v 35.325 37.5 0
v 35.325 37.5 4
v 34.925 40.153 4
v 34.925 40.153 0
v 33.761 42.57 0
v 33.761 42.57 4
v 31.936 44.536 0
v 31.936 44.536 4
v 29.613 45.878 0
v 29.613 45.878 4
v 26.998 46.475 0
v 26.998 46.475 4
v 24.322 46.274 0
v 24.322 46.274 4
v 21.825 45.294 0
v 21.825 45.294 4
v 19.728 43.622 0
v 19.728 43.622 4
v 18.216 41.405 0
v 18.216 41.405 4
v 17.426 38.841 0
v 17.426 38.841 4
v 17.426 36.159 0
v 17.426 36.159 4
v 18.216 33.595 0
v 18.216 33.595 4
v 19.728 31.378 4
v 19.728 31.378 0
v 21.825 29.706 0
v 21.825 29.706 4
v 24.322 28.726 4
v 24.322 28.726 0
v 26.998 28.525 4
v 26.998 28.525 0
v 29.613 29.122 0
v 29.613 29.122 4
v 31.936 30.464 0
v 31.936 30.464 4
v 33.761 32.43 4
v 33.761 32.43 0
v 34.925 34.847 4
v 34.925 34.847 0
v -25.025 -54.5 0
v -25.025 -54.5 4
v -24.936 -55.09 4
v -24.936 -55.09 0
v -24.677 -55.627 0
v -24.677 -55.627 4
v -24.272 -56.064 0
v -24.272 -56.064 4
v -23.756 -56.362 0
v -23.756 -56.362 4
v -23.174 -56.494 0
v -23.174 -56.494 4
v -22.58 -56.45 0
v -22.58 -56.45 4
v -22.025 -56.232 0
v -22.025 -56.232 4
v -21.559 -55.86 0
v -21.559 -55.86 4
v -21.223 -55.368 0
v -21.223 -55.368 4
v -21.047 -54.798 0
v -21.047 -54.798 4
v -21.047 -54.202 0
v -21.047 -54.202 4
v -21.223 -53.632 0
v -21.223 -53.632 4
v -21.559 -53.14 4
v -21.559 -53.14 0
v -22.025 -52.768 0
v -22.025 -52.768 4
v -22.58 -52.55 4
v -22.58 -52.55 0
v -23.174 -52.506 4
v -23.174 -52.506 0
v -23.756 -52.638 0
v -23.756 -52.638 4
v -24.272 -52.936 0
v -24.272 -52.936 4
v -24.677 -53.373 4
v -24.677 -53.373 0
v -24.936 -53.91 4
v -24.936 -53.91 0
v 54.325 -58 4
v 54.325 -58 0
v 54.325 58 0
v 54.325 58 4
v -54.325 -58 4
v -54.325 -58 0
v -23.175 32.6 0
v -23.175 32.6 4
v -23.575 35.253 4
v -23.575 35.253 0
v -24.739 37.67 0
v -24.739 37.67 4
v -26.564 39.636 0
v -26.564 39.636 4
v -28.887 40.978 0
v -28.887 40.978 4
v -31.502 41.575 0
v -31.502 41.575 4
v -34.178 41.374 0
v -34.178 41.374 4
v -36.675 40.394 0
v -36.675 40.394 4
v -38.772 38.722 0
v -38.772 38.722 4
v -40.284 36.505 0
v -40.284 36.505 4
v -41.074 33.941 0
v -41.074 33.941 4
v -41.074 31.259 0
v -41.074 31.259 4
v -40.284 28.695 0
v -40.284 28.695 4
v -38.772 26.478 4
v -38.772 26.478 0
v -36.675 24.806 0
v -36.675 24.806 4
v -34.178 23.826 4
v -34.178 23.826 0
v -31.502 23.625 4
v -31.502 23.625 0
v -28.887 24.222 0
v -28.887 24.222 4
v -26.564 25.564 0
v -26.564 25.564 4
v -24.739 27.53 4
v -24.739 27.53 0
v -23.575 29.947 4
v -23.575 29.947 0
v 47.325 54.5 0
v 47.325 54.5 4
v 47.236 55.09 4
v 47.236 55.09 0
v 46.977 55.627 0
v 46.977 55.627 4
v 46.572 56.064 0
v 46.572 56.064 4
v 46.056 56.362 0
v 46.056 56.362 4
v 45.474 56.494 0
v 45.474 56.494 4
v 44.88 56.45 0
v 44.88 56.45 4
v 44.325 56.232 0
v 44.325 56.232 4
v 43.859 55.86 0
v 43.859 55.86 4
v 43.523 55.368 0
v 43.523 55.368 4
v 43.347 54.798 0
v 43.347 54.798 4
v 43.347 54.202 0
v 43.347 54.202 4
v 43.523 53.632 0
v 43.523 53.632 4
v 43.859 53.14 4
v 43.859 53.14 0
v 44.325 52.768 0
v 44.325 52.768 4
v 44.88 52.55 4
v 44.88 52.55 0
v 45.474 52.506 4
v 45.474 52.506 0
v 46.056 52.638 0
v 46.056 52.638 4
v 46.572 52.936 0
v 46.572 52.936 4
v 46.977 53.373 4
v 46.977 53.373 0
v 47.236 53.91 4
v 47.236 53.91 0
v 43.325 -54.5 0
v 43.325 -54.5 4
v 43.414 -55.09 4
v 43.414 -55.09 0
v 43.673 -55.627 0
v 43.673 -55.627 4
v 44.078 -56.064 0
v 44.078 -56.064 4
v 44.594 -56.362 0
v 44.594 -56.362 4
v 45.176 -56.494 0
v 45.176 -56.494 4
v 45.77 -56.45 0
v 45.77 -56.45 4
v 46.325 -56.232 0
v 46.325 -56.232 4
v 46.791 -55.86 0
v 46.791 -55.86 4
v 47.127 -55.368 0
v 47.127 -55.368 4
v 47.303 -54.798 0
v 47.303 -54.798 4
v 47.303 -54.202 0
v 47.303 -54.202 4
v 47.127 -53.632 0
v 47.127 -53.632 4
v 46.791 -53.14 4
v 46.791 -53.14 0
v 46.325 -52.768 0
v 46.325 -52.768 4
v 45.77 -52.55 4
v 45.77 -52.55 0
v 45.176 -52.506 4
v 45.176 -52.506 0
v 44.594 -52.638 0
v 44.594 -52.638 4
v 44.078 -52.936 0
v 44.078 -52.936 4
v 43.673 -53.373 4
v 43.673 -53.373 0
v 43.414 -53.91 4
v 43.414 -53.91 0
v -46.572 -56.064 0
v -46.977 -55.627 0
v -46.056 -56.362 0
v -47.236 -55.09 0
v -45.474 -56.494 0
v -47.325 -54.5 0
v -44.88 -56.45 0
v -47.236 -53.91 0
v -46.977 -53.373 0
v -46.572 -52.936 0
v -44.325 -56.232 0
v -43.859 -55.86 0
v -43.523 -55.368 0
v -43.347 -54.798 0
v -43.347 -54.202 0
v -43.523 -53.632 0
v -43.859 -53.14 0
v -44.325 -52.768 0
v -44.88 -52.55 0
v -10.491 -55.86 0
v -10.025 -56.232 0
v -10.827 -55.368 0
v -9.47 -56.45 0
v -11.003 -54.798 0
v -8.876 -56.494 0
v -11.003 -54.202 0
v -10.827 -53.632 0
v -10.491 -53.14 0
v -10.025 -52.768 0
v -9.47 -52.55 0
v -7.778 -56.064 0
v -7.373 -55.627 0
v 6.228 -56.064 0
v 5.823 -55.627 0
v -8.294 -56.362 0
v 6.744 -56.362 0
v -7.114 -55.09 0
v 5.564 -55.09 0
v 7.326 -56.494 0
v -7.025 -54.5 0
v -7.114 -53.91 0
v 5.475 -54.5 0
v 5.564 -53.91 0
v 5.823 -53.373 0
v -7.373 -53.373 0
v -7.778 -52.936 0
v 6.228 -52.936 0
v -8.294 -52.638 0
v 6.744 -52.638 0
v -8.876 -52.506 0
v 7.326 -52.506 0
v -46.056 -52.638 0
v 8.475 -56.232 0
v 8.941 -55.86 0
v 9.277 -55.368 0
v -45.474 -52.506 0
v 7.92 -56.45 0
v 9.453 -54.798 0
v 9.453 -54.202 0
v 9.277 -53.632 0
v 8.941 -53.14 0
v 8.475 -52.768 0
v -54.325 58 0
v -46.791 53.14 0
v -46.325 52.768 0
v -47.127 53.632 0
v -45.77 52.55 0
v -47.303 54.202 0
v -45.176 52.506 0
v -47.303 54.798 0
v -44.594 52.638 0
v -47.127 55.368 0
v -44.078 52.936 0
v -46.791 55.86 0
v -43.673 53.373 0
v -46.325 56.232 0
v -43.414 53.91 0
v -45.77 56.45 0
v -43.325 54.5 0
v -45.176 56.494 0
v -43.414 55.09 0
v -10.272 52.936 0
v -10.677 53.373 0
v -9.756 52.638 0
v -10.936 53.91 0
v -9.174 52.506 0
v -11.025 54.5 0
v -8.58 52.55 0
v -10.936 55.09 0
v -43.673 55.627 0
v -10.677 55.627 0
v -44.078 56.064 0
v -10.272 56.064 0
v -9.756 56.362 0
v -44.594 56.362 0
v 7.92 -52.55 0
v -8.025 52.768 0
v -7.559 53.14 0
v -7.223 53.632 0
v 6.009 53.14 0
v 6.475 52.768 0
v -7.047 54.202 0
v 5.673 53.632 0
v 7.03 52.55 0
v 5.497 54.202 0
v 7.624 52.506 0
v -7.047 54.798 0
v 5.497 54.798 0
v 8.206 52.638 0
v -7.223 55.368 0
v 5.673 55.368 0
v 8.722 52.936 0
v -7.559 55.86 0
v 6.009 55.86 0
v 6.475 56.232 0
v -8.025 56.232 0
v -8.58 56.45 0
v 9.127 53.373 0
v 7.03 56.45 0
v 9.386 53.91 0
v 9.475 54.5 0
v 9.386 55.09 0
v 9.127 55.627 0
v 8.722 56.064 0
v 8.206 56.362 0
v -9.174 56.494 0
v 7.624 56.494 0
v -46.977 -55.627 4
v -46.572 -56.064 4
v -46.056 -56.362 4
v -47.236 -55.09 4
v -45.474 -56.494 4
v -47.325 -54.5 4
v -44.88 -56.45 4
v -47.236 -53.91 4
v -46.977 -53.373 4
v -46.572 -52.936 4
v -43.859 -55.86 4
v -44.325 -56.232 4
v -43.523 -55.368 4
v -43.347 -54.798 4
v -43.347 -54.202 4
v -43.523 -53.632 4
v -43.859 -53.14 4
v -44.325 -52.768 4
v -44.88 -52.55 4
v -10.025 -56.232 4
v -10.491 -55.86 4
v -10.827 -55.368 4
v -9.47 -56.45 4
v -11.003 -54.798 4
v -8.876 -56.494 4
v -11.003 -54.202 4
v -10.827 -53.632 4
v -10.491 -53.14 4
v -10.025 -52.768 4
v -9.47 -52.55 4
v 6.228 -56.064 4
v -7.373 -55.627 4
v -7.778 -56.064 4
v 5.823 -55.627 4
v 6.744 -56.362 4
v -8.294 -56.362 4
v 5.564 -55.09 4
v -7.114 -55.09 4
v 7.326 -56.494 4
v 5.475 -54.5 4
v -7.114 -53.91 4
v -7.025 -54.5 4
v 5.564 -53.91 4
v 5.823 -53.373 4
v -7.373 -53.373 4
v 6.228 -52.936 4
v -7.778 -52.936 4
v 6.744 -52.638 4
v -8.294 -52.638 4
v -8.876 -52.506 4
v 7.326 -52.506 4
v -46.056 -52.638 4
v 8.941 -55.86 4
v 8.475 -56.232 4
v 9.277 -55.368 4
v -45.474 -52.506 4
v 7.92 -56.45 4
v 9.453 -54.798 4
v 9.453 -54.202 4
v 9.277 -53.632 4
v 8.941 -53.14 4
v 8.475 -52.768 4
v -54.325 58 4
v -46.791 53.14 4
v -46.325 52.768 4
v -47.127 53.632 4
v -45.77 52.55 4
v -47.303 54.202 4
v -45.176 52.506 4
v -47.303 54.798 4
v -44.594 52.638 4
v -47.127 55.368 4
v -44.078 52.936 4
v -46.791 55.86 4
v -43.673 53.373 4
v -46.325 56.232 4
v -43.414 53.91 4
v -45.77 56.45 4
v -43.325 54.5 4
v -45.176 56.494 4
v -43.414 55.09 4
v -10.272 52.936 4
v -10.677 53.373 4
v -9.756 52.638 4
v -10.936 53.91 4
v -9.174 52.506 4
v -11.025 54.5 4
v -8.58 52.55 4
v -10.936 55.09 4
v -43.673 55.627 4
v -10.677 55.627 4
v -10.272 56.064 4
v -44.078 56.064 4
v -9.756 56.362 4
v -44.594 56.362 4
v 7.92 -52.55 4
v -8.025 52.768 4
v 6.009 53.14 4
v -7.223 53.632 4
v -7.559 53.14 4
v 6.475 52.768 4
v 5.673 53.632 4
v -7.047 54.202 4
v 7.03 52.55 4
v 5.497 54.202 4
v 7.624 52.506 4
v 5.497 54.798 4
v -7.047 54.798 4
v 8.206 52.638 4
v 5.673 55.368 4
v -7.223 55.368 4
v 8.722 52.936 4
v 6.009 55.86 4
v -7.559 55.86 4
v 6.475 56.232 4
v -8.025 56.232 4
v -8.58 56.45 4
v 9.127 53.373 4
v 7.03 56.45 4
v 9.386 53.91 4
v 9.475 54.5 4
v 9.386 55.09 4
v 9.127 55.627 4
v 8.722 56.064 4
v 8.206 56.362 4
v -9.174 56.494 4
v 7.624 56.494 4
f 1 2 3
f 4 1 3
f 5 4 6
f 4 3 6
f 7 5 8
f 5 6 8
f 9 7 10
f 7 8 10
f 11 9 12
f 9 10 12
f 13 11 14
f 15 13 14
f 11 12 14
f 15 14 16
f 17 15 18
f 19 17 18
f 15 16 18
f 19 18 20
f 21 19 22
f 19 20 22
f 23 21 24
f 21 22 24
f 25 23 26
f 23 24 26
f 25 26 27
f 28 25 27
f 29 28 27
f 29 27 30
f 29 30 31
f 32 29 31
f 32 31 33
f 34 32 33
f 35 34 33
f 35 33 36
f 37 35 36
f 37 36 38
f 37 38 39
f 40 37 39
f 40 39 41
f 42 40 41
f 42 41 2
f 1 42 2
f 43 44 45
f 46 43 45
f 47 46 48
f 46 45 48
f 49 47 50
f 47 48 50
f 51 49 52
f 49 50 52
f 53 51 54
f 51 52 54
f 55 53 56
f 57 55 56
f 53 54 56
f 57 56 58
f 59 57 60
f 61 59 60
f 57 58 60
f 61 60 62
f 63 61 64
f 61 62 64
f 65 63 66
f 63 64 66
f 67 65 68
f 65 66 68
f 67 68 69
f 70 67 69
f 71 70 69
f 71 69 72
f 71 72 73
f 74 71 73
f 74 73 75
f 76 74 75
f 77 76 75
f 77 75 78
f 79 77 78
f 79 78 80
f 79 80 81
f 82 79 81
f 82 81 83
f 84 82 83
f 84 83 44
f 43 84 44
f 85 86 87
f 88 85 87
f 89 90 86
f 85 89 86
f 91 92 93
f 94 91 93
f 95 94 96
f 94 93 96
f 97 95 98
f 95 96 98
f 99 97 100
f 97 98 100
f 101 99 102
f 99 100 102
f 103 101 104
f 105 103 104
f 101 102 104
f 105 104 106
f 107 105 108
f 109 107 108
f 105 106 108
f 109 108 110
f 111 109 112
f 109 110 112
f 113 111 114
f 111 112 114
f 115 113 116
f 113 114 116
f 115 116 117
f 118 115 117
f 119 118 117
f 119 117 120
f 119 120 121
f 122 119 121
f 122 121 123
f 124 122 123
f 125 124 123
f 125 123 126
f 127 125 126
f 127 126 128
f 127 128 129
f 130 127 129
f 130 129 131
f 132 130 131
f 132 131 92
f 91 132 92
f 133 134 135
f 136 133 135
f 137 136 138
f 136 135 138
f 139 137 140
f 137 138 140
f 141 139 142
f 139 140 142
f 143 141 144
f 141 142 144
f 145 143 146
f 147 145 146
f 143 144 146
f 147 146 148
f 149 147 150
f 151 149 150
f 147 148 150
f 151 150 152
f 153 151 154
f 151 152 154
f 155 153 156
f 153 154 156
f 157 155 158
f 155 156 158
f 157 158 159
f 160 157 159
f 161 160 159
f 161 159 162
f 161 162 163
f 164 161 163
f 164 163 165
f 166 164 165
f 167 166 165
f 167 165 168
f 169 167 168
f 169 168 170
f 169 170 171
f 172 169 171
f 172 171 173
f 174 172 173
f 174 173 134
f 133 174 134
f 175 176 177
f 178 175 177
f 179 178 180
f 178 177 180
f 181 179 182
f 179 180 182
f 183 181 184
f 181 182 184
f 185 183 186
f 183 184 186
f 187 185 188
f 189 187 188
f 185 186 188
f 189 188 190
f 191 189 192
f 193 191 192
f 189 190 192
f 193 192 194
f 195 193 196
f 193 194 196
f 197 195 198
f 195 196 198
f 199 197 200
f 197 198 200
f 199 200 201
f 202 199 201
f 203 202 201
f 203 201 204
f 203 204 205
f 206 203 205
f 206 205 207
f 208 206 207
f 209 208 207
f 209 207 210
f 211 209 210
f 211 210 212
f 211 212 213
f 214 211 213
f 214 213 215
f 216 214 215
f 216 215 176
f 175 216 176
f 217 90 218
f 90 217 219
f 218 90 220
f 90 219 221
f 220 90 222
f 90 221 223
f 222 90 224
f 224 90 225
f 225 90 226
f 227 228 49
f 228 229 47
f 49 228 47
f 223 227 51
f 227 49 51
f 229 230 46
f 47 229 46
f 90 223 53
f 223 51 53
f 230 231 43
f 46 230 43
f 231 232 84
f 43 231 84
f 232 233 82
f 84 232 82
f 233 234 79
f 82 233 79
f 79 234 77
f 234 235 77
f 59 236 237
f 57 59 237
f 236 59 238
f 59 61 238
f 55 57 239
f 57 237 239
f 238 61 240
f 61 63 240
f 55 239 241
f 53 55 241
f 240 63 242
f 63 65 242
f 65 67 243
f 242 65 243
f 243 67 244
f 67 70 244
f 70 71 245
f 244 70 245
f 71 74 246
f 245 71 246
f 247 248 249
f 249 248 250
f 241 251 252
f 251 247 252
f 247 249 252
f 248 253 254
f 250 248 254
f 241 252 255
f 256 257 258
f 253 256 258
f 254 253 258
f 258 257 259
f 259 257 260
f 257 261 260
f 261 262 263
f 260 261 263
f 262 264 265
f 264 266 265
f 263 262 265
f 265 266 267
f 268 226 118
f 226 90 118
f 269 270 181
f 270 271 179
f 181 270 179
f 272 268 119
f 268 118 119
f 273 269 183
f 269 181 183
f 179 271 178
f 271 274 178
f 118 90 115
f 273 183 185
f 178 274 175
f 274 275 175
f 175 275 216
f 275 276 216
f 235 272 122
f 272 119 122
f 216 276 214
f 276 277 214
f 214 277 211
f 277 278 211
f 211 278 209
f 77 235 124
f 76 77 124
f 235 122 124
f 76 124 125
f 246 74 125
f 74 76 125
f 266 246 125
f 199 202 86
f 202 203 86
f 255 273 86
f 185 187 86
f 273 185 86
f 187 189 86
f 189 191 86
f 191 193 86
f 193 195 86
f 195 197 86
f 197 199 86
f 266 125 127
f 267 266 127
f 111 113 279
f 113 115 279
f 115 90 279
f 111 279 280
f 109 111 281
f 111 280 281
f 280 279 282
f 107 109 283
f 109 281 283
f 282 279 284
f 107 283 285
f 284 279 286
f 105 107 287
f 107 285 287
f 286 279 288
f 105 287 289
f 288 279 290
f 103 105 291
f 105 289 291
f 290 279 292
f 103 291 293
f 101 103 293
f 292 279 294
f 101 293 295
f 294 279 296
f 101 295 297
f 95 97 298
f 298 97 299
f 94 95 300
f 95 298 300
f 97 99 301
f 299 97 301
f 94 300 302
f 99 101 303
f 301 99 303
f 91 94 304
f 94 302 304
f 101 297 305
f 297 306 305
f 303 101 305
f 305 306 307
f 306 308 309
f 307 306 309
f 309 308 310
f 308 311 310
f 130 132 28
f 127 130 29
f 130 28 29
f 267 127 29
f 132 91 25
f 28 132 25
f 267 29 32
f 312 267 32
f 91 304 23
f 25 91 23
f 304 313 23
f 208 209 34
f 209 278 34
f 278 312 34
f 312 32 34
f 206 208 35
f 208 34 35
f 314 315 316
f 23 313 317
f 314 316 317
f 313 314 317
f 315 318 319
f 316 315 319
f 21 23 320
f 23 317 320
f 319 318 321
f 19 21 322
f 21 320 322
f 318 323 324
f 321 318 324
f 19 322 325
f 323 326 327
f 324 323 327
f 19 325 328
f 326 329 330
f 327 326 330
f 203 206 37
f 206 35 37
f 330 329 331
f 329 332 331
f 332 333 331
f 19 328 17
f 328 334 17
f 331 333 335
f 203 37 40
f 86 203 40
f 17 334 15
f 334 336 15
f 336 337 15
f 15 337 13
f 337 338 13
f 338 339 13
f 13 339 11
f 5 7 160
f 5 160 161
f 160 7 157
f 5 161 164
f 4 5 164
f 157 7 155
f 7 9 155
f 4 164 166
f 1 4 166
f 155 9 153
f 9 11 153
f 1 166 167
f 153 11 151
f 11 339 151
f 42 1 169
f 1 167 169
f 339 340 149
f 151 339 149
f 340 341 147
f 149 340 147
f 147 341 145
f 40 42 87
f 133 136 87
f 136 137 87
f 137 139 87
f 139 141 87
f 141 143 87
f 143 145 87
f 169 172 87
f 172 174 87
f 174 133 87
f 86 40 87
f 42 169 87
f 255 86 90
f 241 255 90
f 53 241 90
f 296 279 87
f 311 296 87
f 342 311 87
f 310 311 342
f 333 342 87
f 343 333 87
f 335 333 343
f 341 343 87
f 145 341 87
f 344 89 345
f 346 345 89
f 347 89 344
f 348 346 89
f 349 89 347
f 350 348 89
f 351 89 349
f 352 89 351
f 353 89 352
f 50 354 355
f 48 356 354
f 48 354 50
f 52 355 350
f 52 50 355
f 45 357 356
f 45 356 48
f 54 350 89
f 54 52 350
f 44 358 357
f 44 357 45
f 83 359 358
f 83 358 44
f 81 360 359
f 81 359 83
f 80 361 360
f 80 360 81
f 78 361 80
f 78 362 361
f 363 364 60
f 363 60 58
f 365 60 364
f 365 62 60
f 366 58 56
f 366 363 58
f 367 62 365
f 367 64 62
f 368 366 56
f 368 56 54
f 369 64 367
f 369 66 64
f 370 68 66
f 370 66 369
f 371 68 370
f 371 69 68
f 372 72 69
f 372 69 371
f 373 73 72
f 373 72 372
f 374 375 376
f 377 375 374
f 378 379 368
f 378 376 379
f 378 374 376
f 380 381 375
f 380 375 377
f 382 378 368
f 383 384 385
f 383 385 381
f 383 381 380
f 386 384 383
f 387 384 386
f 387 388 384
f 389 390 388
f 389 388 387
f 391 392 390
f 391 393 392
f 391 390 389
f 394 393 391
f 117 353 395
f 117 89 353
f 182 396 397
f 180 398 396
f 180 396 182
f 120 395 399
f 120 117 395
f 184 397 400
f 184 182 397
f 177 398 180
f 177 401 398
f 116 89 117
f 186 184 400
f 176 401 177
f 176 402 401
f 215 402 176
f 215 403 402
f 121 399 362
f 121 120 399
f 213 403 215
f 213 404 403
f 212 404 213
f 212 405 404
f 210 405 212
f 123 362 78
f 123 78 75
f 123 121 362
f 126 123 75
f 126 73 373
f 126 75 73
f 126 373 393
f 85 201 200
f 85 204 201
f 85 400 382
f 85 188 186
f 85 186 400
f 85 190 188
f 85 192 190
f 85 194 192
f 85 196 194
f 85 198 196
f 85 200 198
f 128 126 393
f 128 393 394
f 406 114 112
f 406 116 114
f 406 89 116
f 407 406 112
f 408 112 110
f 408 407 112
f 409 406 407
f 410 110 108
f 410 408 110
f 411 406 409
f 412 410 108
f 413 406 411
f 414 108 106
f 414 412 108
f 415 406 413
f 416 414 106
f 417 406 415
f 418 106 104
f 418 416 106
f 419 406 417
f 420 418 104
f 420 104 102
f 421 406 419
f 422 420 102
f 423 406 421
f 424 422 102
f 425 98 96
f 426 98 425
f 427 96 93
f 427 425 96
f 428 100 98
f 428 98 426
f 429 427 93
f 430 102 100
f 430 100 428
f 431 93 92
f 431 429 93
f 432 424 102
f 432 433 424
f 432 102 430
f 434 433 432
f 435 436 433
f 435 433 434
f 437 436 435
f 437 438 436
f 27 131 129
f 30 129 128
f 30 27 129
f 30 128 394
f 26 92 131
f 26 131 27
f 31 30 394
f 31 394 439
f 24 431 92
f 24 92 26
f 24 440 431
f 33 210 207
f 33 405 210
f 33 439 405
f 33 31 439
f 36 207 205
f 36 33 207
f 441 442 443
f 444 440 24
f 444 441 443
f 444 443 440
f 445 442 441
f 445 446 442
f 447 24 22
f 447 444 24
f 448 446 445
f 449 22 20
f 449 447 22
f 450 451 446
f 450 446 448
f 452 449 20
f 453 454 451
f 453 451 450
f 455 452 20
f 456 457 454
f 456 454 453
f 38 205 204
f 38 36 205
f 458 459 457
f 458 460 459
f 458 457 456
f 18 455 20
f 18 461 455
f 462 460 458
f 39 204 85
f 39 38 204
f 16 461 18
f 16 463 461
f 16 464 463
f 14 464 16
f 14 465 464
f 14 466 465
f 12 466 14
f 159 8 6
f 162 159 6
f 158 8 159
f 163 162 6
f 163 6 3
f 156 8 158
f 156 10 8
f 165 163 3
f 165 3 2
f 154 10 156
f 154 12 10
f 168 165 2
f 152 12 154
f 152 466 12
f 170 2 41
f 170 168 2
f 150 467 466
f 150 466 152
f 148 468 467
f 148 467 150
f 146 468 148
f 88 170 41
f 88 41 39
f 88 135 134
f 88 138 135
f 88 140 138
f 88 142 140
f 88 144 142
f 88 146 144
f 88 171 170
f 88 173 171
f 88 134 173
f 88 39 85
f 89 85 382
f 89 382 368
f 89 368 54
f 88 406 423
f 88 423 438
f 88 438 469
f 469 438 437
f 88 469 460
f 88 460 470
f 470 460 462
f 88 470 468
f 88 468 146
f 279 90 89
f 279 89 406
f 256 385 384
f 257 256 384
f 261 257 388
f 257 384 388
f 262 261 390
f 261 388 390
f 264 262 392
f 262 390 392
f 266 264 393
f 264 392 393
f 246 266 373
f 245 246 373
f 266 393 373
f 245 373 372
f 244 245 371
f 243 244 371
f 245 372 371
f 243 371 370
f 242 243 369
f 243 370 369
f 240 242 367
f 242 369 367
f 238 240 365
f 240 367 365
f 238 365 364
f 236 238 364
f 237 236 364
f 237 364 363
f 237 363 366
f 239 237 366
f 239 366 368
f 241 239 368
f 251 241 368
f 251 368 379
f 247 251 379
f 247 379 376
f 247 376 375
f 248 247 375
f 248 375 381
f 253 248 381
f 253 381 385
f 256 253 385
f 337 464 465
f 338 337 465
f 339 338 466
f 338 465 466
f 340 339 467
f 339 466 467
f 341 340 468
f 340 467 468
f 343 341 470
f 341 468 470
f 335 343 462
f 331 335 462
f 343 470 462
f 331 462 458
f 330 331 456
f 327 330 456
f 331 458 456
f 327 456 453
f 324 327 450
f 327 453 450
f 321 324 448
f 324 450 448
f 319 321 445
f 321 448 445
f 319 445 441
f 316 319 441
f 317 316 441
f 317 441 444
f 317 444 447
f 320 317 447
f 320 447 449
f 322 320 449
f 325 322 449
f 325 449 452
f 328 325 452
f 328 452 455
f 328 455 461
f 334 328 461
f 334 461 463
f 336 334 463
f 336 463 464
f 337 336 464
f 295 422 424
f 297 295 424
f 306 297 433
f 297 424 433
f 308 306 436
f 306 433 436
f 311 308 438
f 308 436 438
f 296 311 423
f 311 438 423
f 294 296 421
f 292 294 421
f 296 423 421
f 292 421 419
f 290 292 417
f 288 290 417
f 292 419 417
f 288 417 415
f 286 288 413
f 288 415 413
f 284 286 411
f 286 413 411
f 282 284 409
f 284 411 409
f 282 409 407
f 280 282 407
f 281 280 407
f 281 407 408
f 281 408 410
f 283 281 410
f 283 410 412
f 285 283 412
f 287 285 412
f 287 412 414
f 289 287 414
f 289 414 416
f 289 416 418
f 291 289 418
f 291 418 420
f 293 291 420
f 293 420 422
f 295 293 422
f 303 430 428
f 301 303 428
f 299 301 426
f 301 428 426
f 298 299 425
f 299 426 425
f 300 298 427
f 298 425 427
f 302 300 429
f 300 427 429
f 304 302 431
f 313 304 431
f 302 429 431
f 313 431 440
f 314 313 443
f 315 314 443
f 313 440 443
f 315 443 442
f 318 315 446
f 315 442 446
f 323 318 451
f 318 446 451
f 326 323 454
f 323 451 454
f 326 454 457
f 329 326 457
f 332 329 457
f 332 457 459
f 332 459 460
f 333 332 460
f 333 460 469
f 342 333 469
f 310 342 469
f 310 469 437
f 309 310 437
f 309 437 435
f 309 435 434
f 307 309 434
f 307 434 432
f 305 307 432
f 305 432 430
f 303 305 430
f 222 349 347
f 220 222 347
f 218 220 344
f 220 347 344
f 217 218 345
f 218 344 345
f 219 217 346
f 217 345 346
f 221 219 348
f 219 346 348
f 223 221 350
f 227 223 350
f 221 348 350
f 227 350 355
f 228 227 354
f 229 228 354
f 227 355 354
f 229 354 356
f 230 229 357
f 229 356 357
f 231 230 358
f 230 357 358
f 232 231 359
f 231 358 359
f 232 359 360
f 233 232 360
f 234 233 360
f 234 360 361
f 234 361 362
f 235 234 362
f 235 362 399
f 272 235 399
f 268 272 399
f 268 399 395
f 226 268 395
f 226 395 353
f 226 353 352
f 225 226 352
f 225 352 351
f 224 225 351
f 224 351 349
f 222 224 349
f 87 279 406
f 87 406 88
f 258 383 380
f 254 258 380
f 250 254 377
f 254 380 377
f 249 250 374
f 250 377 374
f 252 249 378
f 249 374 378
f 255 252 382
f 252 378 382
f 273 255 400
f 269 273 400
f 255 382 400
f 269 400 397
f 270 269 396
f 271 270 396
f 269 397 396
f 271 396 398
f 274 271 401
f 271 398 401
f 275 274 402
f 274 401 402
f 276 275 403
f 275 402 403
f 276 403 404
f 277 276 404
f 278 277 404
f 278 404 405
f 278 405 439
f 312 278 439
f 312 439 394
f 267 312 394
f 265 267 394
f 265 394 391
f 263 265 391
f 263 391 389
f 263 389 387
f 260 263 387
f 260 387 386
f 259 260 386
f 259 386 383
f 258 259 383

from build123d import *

# Parameters (mm, degrees)
SKETCH1_W           = 108.65
SKETCH1_H           = 116
BOSS_EXTRUDE1_DEPTH = 4
SKETCH2_R           = 9
CUT_EXTRUDE1_DEPTH  = 80.568873468
SKETCH4_R           = 2
CUT_EXTRUDE2_DEPTH  = 80.568873468


with BuildPart() as part:
    # Sketch1 → Boss-Extrude1 (new body)
    with BuildSketch(Plane.XY):
        Rectangle(SKETCH1_W, SKETCH1_H)
    extrude(amount=BOSS_EXTRUDE1_DEPTH)

    # Sketch2 → Cut-Extrude1 (cut, through all)
    with BuildSketch(Plane.XY.offset(4)):
        with Locations((26.325, 37.5)):
            Circle(SKETCH2_R)
        with Locations((-32.175, 32.6)):
            Circle(SKETCH2_R)
    extrude(amount=-CUT_EXTRUDE1_DEPTH, mode=Mode.SUBTRACT)

    # Sketch4 → Cut-Extrude2 (cut, through all)
    with BuildSketch(Plane.XY.offset(4)):
        with Locations((-45.325, 54.5)):
            Circle(SKETCH4_R)
        with Locations(Location((-45.325, -54.5, 0), (0, 0, 180))):
            Circle(SKETCH4_R)
        with Locations(Location((-9.025, 54.5, 0), (0, 0, 180))):
            Circle(SKETCH4_R)
        with Locations((-9.025, -54.5)):
            Circle(SKETCH4_R)
        with Locations(Location((-23.025, -54.5, 0), (0, 0, 180))):
            Circle(SKETCH4_R)
        with Locations((7.475, 54.5)):
            Circle(SKETCH4_R)
        with Locations(Location((7.475, -54.5, 0), (0, 0, 180))):
            Circle(SKETCH4_R)
        with Locations((45.325, 54.5)):
            Circle(SKETCH4_R)
        with Locations(Location((45.325, -54.5, 0), (0, 0, 180))):
            Circle(SKETCH4_R)
    extrude(amount=-CUT_EXTRUDE2_DEPTH, mode=Mode.SUBTRACT)


solid = part.part
